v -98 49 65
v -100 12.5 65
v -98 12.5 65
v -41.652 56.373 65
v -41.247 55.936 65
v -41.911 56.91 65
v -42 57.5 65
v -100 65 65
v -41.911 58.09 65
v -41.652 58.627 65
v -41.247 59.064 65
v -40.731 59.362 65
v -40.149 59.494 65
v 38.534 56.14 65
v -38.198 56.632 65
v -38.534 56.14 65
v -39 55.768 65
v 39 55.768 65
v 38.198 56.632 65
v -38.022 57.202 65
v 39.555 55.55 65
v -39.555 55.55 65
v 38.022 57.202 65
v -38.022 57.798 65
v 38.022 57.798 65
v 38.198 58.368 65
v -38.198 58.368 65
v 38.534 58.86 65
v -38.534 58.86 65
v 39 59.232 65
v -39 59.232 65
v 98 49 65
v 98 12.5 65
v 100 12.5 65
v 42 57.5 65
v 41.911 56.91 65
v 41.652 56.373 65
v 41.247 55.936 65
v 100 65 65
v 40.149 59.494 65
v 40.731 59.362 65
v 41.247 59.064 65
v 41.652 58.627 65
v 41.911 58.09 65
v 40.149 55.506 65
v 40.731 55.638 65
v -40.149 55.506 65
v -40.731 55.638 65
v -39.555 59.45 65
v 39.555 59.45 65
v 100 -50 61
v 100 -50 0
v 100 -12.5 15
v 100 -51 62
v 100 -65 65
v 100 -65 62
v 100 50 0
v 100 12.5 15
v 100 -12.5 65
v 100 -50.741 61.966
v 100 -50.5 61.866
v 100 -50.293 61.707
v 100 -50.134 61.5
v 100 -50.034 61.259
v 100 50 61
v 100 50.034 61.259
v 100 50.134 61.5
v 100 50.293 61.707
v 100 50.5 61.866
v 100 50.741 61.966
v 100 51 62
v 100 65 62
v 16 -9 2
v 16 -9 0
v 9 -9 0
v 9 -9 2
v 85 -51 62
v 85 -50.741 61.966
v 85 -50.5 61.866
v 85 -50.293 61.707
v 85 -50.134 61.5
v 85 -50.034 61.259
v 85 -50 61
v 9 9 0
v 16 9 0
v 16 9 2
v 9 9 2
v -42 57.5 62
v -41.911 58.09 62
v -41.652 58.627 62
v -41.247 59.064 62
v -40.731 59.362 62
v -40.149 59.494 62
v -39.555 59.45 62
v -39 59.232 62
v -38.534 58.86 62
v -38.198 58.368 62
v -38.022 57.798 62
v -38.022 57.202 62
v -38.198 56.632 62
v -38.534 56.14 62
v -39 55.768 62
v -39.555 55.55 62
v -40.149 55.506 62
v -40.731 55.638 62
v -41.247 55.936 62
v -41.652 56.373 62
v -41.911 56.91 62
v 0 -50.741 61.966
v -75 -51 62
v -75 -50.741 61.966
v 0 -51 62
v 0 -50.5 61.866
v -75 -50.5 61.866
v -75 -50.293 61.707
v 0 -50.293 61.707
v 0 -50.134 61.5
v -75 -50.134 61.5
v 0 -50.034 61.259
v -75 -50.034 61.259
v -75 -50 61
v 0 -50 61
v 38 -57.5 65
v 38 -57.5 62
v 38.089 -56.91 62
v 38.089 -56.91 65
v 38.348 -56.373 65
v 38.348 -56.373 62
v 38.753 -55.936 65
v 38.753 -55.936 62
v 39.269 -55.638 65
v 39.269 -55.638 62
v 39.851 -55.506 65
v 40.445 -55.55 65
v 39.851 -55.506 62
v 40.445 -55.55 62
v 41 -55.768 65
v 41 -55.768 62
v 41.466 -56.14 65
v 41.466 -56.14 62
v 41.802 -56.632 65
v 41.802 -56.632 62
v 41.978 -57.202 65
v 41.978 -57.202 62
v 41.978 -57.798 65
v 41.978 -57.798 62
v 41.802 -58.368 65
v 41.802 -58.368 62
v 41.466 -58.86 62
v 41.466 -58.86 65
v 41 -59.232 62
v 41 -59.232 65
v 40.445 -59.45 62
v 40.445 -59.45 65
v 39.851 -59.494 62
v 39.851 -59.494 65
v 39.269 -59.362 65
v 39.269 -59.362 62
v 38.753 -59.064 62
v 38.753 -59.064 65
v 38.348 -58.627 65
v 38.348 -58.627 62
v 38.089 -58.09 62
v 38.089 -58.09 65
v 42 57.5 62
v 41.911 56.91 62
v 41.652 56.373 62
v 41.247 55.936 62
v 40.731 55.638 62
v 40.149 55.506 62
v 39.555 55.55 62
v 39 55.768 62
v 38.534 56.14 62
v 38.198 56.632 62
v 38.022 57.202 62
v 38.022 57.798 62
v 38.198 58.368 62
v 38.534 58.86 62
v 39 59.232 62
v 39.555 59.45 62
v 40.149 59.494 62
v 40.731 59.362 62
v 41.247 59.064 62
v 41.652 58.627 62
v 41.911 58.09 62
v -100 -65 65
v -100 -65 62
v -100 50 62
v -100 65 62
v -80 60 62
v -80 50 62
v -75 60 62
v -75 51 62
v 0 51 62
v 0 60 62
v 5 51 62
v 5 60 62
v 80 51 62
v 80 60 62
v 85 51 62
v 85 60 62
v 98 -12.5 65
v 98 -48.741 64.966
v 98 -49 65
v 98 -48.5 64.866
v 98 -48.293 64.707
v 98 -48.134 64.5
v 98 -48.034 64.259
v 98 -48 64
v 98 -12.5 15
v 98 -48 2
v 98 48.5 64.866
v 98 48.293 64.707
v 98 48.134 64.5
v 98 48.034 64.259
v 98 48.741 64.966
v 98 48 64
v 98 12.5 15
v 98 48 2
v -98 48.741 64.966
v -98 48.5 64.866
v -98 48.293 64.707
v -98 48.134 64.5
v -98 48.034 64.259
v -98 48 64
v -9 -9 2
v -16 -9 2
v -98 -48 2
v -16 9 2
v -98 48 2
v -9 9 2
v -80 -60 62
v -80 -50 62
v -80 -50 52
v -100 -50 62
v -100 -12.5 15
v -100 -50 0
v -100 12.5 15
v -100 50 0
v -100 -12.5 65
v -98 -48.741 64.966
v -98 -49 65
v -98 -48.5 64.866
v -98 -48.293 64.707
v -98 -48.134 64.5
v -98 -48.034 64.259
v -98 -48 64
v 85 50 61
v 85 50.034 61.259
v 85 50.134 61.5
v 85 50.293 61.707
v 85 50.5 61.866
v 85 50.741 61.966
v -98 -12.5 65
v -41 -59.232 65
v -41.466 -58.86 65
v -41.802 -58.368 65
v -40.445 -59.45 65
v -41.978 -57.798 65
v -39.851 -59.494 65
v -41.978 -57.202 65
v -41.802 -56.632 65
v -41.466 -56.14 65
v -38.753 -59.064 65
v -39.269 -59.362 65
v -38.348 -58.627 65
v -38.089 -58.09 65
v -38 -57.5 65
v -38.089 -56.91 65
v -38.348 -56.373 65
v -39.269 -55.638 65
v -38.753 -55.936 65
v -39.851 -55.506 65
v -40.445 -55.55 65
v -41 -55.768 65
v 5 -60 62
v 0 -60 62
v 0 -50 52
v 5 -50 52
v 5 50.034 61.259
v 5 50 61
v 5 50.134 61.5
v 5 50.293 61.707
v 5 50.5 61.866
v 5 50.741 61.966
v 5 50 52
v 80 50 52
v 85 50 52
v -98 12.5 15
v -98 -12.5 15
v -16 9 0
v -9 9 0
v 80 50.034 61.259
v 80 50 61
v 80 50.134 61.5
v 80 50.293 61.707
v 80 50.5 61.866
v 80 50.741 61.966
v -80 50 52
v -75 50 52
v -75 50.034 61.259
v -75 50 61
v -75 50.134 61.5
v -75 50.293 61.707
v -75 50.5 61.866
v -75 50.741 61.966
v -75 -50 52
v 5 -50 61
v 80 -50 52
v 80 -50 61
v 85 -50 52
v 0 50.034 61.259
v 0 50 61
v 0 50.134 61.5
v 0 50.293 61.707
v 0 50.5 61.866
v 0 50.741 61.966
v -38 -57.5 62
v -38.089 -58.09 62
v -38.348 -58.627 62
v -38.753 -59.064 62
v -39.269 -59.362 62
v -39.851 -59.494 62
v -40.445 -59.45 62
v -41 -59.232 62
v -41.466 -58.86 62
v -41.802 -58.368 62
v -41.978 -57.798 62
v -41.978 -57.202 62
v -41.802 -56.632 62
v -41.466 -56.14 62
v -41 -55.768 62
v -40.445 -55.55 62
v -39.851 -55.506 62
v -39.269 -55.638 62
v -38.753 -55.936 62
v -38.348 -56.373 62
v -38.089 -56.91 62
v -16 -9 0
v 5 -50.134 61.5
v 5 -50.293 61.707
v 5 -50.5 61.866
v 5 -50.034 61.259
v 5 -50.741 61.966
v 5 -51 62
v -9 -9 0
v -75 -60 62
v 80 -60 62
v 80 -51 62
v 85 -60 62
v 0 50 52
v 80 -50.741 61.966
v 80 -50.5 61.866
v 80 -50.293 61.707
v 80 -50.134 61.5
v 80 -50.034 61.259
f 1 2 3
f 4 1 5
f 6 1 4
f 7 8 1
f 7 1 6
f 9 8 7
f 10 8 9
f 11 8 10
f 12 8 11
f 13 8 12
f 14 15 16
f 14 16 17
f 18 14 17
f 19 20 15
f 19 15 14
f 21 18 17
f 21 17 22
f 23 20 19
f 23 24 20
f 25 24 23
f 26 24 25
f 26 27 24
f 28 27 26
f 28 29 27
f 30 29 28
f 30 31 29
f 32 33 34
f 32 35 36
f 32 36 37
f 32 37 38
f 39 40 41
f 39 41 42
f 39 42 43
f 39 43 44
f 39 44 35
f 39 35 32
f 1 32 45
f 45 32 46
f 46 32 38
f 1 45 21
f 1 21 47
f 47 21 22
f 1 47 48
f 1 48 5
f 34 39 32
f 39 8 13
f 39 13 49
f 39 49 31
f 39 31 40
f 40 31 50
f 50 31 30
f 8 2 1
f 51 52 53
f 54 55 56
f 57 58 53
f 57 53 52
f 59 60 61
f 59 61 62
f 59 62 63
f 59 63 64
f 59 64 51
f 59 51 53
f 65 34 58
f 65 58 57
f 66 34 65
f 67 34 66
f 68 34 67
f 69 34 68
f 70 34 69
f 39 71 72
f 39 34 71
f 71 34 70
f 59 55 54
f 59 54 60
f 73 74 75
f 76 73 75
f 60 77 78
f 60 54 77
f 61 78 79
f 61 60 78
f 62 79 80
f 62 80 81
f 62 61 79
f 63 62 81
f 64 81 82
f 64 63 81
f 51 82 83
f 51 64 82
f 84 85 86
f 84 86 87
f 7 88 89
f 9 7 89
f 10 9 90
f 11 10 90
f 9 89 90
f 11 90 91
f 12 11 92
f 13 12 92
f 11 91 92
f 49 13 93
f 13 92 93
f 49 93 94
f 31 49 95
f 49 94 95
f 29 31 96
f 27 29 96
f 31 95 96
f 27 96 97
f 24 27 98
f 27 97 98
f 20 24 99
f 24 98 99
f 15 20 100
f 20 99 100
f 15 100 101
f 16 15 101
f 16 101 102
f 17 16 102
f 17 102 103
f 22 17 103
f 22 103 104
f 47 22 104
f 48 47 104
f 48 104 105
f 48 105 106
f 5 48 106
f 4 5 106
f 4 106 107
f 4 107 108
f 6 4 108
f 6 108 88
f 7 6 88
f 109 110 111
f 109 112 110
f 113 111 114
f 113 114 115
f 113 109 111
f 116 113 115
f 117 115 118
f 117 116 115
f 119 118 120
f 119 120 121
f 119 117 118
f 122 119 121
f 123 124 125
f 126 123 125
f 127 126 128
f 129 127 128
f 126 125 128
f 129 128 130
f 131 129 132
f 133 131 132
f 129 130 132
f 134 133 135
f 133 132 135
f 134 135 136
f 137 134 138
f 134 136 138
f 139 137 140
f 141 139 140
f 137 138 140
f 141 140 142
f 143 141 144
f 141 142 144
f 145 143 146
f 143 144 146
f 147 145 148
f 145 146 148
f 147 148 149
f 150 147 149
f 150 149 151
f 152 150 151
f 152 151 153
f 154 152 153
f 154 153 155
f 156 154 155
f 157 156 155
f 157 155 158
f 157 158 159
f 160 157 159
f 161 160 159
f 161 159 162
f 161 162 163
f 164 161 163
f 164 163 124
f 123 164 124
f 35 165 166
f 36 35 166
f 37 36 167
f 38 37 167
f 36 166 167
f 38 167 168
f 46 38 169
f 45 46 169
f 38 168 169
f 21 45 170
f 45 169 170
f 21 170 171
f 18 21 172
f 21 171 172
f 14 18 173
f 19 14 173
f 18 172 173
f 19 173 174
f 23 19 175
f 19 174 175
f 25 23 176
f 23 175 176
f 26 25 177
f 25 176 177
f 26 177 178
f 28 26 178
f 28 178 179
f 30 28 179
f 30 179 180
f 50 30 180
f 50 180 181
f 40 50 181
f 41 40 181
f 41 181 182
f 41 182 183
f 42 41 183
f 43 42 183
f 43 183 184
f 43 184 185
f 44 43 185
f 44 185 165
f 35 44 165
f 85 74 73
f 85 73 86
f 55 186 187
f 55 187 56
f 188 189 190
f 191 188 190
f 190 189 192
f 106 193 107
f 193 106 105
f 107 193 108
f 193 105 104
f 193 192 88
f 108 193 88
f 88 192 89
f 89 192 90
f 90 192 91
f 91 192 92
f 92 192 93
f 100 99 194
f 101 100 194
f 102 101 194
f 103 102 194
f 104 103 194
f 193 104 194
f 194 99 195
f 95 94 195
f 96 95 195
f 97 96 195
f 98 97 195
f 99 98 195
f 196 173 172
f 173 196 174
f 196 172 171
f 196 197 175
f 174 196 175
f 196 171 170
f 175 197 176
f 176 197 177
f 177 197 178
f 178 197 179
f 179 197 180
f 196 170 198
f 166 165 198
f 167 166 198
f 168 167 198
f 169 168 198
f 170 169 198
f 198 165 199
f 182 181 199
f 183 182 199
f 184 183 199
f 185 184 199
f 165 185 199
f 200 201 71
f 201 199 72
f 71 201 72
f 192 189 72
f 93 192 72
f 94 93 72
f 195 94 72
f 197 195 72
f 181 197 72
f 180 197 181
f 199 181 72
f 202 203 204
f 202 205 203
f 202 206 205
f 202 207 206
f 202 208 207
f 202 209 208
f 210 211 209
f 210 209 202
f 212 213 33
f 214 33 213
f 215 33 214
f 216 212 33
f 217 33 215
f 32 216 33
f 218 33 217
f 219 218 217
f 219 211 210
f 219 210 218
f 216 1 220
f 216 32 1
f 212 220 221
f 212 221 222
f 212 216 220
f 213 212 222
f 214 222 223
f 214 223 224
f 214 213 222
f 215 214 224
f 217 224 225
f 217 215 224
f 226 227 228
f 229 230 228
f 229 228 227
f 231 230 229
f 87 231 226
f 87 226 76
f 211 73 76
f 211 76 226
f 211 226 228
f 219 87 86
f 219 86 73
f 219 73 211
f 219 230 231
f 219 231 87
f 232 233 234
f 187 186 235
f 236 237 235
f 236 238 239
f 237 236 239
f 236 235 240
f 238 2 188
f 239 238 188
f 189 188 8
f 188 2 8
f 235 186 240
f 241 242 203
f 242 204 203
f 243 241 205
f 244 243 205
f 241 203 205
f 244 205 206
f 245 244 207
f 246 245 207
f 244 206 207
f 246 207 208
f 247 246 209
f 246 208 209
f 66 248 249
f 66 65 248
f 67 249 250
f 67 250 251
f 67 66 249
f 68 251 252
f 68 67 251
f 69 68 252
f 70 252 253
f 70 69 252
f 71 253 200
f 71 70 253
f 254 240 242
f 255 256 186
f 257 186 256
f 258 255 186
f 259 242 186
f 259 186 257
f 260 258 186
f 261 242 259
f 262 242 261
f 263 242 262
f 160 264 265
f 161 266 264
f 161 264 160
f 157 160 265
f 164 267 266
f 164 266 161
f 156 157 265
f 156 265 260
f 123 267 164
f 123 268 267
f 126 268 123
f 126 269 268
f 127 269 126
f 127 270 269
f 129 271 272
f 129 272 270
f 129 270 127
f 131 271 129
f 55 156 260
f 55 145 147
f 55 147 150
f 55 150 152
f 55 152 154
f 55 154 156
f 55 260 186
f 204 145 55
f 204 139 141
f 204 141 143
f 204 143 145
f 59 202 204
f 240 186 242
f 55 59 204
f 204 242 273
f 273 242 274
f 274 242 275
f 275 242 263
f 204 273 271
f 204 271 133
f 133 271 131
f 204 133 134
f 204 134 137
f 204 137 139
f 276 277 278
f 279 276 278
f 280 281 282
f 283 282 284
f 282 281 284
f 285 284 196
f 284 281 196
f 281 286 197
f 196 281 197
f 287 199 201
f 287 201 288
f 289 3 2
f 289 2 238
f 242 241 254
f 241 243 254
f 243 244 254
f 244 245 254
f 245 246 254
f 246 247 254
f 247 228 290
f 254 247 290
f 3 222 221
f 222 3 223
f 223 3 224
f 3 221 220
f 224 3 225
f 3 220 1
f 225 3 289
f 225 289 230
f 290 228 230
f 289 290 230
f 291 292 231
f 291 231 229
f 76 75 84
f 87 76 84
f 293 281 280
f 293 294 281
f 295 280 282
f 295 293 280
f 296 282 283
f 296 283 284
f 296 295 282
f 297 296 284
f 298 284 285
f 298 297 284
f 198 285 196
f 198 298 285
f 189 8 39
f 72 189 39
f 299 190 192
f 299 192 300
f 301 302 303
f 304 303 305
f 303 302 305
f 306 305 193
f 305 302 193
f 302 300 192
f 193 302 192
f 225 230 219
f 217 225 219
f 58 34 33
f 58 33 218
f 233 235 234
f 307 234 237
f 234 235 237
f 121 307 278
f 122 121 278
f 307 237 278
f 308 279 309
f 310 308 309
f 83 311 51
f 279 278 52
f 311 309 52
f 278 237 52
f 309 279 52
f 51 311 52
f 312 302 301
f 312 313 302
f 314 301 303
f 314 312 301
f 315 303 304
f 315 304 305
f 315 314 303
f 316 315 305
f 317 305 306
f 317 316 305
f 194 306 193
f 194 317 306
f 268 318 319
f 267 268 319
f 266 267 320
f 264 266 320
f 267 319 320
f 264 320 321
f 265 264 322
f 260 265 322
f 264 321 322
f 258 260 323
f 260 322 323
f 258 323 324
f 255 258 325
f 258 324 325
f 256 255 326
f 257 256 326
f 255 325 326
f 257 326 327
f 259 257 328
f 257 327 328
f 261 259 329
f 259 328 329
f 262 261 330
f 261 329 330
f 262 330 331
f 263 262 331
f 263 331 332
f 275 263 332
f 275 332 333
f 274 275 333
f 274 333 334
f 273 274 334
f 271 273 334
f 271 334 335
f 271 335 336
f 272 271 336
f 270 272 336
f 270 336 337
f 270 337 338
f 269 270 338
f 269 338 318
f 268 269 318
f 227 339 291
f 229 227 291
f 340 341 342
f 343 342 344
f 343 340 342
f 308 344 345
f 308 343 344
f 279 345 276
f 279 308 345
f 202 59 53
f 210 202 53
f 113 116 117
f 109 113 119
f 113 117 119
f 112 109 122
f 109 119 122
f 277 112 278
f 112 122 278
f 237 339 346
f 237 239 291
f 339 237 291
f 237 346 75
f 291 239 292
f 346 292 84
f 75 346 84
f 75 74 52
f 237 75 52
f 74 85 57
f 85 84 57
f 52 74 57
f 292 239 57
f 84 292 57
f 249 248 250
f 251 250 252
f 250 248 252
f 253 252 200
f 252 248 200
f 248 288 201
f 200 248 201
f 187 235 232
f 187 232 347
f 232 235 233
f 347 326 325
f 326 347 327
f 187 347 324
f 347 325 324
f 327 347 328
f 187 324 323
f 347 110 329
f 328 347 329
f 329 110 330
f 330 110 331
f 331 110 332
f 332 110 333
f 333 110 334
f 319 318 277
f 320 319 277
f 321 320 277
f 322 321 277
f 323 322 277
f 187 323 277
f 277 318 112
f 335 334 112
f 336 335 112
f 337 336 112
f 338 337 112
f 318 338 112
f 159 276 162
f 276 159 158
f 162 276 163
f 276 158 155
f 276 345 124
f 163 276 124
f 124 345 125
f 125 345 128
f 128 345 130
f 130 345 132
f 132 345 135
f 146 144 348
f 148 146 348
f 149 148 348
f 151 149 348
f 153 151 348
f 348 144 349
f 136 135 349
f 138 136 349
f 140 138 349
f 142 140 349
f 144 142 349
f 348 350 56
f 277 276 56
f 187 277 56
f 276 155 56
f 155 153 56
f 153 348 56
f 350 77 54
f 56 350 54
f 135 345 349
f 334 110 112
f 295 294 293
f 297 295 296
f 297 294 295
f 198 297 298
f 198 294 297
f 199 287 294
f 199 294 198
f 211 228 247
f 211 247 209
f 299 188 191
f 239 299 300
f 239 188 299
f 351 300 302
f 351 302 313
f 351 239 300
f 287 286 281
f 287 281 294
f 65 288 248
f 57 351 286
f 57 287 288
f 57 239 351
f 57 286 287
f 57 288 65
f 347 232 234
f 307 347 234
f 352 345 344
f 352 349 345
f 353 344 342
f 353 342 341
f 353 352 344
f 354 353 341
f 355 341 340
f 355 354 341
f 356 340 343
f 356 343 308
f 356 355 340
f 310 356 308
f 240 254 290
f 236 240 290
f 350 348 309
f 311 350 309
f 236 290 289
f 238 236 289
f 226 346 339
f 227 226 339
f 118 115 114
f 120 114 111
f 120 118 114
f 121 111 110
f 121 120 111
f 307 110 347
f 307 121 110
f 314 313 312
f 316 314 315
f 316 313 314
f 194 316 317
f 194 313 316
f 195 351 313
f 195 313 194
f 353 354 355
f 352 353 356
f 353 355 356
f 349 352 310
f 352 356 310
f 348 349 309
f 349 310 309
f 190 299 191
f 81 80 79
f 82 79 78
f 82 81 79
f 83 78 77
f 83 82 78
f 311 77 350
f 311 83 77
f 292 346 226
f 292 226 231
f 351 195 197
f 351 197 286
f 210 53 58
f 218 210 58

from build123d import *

# Parameters (mm, degrees)
SKETCH_1_W             = 200
SKETCH_1_H             = 100
EXTRUDE_1_DEPTH        = 2
SKETCH_2_W             = 200
SKETCH_2_H             = 100
SKETCH_2_W_2           = 196
SKETCH_2_H_2           = 96
EXTRUDE_2_DEPTH        = 63
SKETCH_3_W             = 7
SKETCH_3_H             = 18
CUT_EXTRUDE_1_DEPTH    = 63
SKETCH_4_W             = 200
SKETCH_4_H             = 15
EXTRUDE_3_DEPTH        = 3
EXTRUDE_4_DEPTH        = 5
PATTERN_LINEAR_1_COUNT = 2
PATTERN_LINEAR_1_PITCH = 80
PATTERN_LINEAR_2_COUNT = 2
PATTERN_LINEAR_2_PITCH = 80
SKETCH_6_R             = 2
CUT_EXTRUDE_2_DEPTH    = 5
FILLET_1_R             = 1
SKETCH_7_W             = 50
SKETCH_7_H             = 25
CUT_EXTRUDE_3_DEPTH    = 281


with BuildPart() as part:
    # 草图1 → 凸台-拉伸1 (new body)
    with BuildSketch(Plane.XY):
        Rectangle(SKETCH_1_W, SKETCH_1_H)
    extrude(amount=EXTRUDE_1_DEPTH)

    # 草图2 → 凸台-拉伸2 (add)
    with BuildSketch(Plane.XY.offset(2)):
        Rectangle(SKETCH_2_W, SKETCH_2_H)
        Rectangle(SKETCH_2_W_2, SKETCH_2_H_2, mode=Mode.SUBTRACT)
    extrude(amount=EXTRUDE_2_DEPTH)

    # 草图3 → 切除-拉伸1 (cut)
    with BuildSketch(Plane(origin=(0, 0, 0), x_dir=(-1, 0, 0), z_dir=(0, 0, -1))):
        with Locations((12.5, 0)):
            Rectangle(SKETCH_3_W, SKETCH_3_H)
        with Locations((-12.5, 0)):
            Rectangle(SKETCH_3_W, SKETCH_3_H)
    extrude(amount=-CUT_EXTRUDE_1_DEPTH, mode=Mode.SUBTRACT)

    # 草图4 → 凸台-拉伸3 (add)
    with BuildSketch(Plane.XY.offset(65)):
        with Locations((0, 57.5)):
            Rectangle(SKETCH_4_W, SKETCH_4_H)
        with Locations((0, -57.5)):
            Rectangle(SKETCH_4_W, SKETCH_4_H)
    extrude(amount=-EXTRUDE_3_DEPTH)

    # 草图5 → 凸台-拉伸4 (add)
    with BuildSketch(Plane(origin=(0, 0, 0), x_dir=(0, 0, -1), z_dir=(1, 0, 0))):
        Polygon((-62, 60), (-52, 50), (-62, 50), align=None)
        Polygon((-52, -50), (-62, -50), (-62, -60), align=None)
    extrude_4 = extrude(amount=EXTRUDE_4_DEPTH)

    # 阵列(线性)1: 凸台-拉伸4 ×2
    with Locations(*[(-i * PATTERN_LINEAR_1_PITCH, 0, 0) for i in range(1, PATTERN_LINEAR_1_COUNT)]):
        add(extrude_4)

    # 阵列(线性)2: 凸台-拉伸4 ×2
    with Locations(*[(i * PATTERN_LINEAR_2_PITCH, 0, 0) for i in range(1, PATTERN_LINEAR_2_COUNT)]):
        add(extrude_4)

    # 草图6 → 切除-拉伸2 (cut)
    with BuildSketch(Plane(origin=(0, 0, 62), x_dir=(-1, 0, 0), z_dir=(0, 0, -1))):
        with Locations((-40, -57.5)):
            Circle(SKETCH_6_R)
        with Locations(Location((40, -57.5, 0), (0, 0, 180))):
            Circle(SKETCH_6_R)
        with Locations((40, 57.5)):
            Circle(SKETCH_6_R)
        with Locations(Location((-40, 57.5, 0), (0, 0, 180))):
            Circle(SKETCH_6_R)
    extrude(amount=-CUT_EXTRUDE_2_DEPTH, mode=Mode.SUBTRACT)

    # 圆角1
    fillet_1_edges = [part.edges().sort_by_distance(p)[0] for p in [
        (42.5, 50, 62),
        (-37.5, -50, 62),
        (-37.5, 50, 62),
        (92.5, 50, 62),
        (42.5, -50, 62),
        (0, 48, 65),
        (0, -48, 65),
        (92.5, -50, 62),
    ]]
    fillet(fillet_1_edges, radius=FILLET_1_R)

    # 草图7 → 切除-拉伸3 (cut)
    with BuildSketch(Plane(origin=(100, 0, 0), x_dir=(0, 0, -1), z_dir=(1, 0, 0))):
        with Locations((-40, 0)):
            Rectangle(SKETCH_7_W, SKETCH_7_H)
    extrude(amount=-CUT_EXTRUDE_3_DEPTH, mode=Mode.SUBTRACT)


solid = part.part
